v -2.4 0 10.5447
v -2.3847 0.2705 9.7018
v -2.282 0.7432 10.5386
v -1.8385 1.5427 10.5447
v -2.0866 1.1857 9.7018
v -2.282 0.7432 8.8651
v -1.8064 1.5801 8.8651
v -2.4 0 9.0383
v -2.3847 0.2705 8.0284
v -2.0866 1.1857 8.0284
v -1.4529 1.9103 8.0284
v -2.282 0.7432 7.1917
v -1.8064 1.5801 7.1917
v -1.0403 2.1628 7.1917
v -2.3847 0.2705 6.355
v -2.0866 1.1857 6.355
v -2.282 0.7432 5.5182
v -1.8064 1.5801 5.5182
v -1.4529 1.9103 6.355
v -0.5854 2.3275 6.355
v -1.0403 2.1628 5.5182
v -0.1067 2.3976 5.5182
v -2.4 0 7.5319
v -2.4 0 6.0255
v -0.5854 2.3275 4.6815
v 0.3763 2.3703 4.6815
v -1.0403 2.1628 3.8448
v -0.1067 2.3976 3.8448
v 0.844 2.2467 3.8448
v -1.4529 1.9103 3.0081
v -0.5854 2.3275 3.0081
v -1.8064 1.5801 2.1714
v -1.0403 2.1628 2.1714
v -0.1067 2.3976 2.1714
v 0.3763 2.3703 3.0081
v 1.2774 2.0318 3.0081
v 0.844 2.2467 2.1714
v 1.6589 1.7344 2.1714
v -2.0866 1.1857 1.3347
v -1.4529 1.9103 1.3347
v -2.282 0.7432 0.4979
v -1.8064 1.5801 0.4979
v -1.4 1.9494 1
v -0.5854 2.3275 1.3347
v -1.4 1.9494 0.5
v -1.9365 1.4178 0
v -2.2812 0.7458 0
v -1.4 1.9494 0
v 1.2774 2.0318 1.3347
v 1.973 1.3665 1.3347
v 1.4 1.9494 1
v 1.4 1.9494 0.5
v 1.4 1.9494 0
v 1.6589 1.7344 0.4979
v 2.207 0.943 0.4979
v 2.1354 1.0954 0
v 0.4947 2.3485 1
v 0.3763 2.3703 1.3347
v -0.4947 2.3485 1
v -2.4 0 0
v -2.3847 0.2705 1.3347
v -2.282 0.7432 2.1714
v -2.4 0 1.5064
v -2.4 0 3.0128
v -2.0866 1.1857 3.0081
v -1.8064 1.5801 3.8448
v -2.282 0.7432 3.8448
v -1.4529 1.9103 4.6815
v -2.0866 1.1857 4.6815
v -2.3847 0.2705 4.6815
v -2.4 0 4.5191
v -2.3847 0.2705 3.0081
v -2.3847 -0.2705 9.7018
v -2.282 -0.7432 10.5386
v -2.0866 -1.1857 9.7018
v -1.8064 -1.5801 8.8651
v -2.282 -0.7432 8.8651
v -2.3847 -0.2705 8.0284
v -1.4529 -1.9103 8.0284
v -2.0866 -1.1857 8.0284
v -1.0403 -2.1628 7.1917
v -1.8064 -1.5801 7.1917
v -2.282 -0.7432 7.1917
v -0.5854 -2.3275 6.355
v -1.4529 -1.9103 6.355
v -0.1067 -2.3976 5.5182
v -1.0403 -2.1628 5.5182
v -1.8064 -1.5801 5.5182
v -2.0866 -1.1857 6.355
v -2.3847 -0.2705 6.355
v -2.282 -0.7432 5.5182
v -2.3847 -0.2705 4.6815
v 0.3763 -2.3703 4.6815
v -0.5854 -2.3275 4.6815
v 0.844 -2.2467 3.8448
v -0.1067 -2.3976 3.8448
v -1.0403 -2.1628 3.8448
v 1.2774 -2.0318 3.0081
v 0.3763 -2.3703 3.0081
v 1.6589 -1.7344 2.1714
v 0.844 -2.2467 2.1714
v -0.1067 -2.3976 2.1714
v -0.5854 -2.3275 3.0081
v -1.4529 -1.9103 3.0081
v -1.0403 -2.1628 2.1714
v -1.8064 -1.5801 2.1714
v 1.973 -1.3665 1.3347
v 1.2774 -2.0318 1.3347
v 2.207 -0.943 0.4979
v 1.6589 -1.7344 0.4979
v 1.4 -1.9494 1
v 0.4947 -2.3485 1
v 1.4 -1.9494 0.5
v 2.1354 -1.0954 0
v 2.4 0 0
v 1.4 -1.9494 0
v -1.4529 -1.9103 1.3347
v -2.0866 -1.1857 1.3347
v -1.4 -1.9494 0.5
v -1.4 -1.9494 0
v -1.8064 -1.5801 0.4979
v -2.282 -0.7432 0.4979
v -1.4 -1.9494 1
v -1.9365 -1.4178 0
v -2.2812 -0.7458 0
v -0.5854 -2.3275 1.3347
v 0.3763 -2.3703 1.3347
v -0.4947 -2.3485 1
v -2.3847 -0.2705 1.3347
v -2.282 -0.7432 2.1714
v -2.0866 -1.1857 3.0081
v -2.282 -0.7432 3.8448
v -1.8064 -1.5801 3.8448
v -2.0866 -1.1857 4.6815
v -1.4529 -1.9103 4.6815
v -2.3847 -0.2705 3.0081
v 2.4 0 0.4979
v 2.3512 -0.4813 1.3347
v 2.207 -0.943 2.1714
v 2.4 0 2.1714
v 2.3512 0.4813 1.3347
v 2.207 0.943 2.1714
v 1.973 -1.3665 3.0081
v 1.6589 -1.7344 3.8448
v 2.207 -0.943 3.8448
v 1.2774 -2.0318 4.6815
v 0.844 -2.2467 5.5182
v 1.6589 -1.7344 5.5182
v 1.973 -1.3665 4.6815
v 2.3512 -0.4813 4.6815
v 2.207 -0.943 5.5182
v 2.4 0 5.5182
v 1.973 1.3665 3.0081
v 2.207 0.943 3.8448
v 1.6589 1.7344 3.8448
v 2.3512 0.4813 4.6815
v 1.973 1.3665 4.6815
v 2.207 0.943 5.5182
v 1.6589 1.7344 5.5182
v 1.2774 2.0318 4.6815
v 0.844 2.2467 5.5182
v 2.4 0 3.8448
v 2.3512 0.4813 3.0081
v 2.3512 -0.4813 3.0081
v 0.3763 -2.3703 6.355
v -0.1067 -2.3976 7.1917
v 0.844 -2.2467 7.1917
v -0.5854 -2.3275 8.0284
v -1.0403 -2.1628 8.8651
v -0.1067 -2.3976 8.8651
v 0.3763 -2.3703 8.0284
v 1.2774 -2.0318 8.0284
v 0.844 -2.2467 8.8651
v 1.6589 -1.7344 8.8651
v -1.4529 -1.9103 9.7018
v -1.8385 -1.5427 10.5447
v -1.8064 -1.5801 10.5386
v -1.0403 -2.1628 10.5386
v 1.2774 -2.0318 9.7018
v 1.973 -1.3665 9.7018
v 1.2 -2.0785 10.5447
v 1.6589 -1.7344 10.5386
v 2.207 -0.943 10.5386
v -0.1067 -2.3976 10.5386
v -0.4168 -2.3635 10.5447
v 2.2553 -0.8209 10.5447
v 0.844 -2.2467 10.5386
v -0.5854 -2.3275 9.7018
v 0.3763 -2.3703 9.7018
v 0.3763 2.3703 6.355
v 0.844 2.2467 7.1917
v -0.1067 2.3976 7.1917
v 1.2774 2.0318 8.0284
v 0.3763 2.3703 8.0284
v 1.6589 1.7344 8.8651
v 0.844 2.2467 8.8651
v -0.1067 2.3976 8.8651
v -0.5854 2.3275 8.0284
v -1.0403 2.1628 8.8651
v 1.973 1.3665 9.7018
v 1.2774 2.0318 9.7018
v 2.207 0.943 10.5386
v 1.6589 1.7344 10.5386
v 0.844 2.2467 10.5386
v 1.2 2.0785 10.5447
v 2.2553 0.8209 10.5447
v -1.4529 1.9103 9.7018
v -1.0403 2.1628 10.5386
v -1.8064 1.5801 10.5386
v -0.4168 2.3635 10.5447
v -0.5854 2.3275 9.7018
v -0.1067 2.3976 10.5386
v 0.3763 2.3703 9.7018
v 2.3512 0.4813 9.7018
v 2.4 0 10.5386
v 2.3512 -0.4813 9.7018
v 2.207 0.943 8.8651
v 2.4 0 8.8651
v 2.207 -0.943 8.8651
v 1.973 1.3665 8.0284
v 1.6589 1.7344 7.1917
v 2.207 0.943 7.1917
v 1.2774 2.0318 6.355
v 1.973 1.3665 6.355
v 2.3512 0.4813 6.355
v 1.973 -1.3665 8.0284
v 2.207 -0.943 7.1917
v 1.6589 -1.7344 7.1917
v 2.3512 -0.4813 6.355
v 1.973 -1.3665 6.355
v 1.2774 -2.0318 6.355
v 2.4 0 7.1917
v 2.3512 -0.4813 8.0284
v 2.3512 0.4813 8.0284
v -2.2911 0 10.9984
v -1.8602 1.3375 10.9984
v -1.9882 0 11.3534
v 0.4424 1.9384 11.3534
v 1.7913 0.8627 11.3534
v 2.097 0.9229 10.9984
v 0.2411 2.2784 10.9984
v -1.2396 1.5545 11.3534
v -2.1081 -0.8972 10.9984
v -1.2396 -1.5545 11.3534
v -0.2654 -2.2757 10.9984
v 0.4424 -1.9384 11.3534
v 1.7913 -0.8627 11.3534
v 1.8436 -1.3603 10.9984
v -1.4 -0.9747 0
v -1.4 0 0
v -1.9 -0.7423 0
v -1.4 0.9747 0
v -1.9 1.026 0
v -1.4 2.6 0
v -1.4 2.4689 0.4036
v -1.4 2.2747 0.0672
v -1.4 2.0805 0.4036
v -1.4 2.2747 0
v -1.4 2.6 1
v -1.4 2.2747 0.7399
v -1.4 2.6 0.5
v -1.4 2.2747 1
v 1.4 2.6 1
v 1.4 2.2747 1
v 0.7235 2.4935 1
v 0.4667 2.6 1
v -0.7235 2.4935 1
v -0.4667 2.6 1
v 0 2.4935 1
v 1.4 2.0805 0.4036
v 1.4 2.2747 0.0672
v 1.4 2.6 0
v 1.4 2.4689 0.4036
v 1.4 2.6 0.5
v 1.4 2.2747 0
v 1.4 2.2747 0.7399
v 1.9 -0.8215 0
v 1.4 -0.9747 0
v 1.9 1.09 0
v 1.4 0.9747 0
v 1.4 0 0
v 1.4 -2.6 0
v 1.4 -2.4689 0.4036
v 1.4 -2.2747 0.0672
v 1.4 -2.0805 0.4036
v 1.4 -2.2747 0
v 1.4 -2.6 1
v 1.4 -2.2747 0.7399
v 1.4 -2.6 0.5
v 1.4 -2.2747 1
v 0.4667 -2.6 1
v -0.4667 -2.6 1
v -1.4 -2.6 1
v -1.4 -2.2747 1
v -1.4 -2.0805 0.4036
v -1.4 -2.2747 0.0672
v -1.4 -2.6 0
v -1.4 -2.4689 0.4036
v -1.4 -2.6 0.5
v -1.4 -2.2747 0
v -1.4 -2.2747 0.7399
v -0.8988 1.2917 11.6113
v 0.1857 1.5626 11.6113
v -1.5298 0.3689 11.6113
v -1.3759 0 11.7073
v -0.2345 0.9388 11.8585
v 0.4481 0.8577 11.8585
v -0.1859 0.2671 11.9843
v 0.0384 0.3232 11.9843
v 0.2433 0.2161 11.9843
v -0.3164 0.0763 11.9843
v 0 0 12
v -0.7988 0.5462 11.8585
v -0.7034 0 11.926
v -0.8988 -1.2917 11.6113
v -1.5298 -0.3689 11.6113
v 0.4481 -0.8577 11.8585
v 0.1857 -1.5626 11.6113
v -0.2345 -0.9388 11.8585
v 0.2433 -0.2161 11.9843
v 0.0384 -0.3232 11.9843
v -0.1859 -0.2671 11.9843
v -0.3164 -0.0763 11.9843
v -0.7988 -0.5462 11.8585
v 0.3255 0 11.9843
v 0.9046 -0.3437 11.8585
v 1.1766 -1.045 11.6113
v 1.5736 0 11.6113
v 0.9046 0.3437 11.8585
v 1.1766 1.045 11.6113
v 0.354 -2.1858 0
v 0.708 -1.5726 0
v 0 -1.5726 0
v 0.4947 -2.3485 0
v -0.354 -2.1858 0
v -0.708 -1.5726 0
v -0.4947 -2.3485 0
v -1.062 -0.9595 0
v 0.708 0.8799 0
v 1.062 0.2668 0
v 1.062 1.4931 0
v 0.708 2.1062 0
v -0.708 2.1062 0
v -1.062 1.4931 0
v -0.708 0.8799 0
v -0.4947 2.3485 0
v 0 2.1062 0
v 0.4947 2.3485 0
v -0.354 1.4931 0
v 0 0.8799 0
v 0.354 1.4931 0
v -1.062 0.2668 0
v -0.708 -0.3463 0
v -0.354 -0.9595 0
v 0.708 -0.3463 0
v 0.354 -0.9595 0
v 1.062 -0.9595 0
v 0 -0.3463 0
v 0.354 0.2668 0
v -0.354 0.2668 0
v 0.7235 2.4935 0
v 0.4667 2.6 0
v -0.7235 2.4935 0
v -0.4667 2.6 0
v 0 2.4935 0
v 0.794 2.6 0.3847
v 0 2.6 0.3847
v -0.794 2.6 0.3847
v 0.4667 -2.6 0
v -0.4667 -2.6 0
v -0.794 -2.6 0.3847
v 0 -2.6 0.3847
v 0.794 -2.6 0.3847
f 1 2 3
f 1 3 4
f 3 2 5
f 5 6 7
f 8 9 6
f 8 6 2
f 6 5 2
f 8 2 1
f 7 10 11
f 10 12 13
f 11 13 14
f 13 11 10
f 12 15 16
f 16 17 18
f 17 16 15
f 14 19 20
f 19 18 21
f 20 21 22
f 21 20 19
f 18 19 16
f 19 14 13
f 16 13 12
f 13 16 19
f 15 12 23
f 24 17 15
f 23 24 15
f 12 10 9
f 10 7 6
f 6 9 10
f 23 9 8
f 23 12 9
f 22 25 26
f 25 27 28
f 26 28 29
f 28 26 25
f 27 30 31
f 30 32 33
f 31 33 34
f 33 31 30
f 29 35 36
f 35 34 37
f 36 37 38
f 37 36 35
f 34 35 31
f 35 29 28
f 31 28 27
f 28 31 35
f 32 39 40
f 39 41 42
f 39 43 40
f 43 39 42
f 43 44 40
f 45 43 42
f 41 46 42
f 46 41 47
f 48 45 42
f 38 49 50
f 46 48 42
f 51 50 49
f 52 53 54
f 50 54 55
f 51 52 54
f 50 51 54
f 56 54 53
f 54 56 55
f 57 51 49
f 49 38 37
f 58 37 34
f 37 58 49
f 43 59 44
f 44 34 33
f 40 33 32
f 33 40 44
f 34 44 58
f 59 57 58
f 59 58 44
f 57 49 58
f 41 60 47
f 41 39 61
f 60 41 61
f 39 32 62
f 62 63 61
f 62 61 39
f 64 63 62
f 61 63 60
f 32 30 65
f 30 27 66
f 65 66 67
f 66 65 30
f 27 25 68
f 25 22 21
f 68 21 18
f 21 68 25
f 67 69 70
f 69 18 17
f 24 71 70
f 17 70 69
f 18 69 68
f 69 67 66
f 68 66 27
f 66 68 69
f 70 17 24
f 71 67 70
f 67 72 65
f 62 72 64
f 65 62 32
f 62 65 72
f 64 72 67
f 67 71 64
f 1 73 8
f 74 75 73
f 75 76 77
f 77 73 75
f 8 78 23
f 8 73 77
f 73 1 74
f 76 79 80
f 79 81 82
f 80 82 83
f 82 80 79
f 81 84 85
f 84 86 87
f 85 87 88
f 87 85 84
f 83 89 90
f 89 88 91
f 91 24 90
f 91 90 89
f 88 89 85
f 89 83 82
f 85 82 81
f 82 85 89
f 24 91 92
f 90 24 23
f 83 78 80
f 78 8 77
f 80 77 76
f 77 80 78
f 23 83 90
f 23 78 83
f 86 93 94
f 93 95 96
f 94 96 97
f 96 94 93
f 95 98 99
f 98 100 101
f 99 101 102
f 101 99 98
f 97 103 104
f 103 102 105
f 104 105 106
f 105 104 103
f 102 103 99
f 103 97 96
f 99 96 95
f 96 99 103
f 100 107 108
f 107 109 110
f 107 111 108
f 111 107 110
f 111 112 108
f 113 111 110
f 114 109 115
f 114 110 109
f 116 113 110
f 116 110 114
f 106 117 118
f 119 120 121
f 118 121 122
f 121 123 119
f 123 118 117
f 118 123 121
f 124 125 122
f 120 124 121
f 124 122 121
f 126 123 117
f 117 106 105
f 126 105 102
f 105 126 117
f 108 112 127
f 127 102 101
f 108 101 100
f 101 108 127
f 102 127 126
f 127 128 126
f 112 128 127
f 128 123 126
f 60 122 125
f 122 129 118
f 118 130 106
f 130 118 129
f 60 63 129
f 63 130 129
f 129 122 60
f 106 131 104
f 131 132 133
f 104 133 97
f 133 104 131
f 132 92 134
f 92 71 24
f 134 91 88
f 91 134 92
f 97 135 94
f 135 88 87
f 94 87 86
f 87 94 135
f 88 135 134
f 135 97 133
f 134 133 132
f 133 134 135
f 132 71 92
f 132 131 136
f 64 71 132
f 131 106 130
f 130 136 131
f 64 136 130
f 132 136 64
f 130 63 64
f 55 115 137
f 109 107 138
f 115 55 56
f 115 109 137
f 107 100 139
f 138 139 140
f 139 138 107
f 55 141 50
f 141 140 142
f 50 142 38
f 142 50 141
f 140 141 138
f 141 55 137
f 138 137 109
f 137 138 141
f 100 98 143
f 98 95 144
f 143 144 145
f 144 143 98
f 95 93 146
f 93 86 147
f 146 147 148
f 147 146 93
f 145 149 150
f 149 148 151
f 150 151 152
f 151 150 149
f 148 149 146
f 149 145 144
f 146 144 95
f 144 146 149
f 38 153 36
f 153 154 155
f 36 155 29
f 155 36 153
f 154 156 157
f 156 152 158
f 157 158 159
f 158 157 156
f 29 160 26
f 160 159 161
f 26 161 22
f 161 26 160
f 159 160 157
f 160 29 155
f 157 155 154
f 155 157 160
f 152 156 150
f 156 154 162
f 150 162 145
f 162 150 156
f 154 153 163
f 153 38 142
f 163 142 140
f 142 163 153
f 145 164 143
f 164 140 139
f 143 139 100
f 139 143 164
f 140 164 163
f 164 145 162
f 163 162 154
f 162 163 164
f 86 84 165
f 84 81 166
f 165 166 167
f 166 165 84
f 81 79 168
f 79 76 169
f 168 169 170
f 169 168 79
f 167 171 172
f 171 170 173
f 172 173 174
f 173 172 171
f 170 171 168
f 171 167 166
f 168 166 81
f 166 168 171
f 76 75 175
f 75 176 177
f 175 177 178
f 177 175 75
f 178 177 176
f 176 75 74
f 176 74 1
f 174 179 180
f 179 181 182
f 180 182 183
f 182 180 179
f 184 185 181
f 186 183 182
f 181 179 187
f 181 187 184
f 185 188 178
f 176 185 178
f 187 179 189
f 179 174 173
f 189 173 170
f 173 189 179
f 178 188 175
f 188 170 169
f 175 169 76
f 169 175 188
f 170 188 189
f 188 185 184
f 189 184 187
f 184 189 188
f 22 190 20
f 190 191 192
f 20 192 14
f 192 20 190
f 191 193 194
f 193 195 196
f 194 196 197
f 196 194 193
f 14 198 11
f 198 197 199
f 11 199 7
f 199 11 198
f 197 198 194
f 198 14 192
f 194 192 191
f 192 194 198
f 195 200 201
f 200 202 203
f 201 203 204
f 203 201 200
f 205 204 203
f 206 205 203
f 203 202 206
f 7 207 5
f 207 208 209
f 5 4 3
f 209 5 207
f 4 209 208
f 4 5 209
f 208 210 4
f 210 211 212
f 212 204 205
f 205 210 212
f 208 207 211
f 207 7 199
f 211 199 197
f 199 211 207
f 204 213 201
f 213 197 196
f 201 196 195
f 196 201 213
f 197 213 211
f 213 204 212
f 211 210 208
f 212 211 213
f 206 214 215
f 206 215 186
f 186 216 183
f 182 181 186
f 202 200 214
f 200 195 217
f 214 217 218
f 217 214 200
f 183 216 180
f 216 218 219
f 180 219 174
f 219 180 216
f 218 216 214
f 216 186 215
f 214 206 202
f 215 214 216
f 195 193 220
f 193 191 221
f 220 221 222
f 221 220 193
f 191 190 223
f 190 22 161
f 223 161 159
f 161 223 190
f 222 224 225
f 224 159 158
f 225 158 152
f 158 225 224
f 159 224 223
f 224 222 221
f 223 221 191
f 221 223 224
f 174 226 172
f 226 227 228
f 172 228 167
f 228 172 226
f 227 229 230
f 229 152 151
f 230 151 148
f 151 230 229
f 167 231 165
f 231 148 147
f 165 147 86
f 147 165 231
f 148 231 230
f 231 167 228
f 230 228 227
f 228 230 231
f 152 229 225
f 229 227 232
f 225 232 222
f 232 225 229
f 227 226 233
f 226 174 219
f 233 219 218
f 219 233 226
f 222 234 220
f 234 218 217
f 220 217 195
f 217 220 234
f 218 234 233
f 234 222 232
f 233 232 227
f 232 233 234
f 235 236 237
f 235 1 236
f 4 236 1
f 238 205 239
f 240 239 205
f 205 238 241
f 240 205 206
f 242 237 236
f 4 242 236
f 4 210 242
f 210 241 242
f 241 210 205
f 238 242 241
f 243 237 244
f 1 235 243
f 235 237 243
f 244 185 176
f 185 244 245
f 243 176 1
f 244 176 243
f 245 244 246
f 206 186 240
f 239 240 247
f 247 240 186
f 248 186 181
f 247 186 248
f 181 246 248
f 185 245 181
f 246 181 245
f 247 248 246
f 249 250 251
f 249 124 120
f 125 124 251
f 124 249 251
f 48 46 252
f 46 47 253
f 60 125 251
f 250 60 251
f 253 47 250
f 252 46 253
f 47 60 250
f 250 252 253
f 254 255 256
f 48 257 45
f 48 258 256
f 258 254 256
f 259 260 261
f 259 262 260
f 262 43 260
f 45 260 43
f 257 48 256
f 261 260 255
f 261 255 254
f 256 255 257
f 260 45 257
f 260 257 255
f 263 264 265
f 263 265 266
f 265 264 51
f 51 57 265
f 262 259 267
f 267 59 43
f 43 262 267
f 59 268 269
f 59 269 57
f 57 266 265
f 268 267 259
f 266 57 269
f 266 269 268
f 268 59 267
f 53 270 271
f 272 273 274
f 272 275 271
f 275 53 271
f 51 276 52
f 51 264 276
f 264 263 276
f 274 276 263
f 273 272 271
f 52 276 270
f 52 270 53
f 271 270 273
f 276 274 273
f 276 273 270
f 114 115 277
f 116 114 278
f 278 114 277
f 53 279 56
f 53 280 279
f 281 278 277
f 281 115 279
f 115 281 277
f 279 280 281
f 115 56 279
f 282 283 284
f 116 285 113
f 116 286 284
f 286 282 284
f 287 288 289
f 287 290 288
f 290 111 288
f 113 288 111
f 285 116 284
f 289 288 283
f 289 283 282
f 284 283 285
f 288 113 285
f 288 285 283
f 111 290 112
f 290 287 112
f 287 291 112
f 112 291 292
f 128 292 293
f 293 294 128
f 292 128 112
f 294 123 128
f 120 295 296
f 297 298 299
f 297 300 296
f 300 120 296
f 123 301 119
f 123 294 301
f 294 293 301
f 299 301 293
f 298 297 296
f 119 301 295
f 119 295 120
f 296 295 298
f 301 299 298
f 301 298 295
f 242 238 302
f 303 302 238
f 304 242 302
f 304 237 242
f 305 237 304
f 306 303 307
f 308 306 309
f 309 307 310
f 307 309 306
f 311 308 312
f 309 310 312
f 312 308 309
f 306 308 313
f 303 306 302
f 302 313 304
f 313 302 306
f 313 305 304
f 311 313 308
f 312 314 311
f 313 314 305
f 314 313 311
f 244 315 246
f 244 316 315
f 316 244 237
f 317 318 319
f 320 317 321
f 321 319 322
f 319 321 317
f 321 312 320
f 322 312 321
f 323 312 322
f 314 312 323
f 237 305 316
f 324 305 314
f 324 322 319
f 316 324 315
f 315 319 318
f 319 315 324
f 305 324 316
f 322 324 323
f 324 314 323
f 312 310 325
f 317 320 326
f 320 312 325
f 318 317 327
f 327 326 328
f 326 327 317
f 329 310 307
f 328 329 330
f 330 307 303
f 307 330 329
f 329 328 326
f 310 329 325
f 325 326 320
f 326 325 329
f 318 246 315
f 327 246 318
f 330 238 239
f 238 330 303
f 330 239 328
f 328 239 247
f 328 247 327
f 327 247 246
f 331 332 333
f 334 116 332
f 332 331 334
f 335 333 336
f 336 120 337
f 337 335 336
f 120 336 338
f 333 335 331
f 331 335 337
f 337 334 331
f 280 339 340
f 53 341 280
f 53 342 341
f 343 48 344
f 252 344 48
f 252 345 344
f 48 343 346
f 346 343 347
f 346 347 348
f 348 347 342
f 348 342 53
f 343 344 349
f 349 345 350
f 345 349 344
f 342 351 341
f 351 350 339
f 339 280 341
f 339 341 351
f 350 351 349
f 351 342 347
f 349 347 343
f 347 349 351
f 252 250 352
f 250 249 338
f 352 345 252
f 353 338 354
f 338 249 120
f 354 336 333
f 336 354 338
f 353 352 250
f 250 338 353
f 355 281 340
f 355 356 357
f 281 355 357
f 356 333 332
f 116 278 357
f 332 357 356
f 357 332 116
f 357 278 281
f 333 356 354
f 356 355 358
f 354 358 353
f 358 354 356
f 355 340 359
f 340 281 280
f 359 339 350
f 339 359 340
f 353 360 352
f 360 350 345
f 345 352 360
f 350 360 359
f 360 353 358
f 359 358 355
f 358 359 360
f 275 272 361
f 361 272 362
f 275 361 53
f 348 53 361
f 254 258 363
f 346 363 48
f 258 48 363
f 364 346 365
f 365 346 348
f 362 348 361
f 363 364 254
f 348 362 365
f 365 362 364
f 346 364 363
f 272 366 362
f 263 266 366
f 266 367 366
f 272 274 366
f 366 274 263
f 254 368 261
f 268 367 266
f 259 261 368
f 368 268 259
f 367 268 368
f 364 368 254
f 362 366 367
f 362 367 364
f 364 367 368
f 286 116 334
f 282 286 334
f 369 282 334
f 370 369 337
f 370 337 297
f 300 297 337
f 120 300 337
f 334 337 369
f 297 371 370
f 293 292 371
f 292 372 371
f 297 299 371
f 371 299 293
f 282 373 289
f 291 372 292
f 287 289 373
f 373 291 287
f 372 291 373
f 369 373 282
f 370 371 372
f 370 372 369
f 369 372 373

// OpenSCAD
// CSG file generated from FreeCAD 0.21.2
group() {
 group(){
polyhedron ( points = [[-2.400000,0.000000,10.544682],[-2.400000,0.000000,0.000000],[-1.400000,1.949359,-0.000000],[-1.400000,1.949359,1.000000],[1.400000,1.949359,1.000000],[1.400000,1.949359,-0.000000],[1.400000,-1.949359,0.000000],[1.400000,-1.949359,1.000000],[-1.400000,-1.949359,1.000000],[-1.400000,-1.949359,0.000000],[-1.988235,0.000000,11.353372],[-1.400000,2.600000,-0.000000],[-1.400000,2.600000,1.000000],[1.400000,2.600000,1.000000],[1.400000,2.600000,-0.000000],[1.400000,-2.600000,0.000000],[1.400000,-2.600000,1.000000],[-1.400000,-2.600000,1.000000],[-1.400000,-2.600000,0.000000],[0.000000,0.000000,12.000000],[-1.838511,-1.542697,10.544682],[-0.416754,-2.363537,10.544682],[1.200003,-2.078461,10.544682],[2.255261,-0.820850,10.544682],[2.255261,0.820850,10.544682],[1.200003,2.078461,10.544682],[-0.416754,2.363537,10.544682],[-1.838511,1.542697,10.544682],[-2.400000,0.000000,1.506383],[-2.400000,0.000000,3.012766],[-2.400000,0.000000,4.519149],[-2.400000,0.000000,6.025532],[-2.400000,0.000000,7.531916],[-2.400000,0.000000,9.038299],[-1.936463,1.417784,-0.000000],[-2.281174,0.745818,-0.000000],[-1.400000,1.949359,0.500000],[0.494690,2.348464,1.000000],[-0.494690,2.348464,1.000000],[1.400000,1.949359,0.500000],[2.135416,-1.095445,0.000000],[2.400000,-0.000000,0.000000],[2.135416,1.095445,-0.000000],[1.400000,-1.949359,0.500000],[-0.494690,-2.348464,1.000000],[0.494690,-2.348464,1.000000],[-1.400000,-1.949359,0.500000],[-2.281174,-0.745818,0.000000],[-1.936463,-1.417784,0.000000],[-2.291133,0.000000,10.998425],[-1.239645,-1.554466,11.353372],[0.442425,-1.938383,11.353372],[1.791340,-0.862666,11.353372],[1.791340,0.862666,11.353372],[0.442425,1.938383,11.353372],[-1.239645,1.554466,11.353372],[-1.400000,-0.974679,0.000000],[-1.400000,0.000000,-0.000000],[-1.400000,0.974679,-0.000000],[-1.400000,2.274679,-0.000000],[-1.400000,2.600000,0.500000],[-1.400000,2.274679,1.000000],[-0.466667,2.600000,1.000000],[0.466667,2.600000,1.000000],[1.400000,2.274679,1.000000],[1.400000,2.274679,-0.000000],[1.400000,2.600000,0.500000],[1.400000,0.974679,-0.000000],[1.400000,0.000000,0.000000],[1.400000,-0.974679,0.000000],[1.400000,-2.274679,0.000000],[1.400000,-2.600000,0.500000],[1.400000,-2.274679,1.000000],[0.466667,-2.600000,1.000000],[-0.466667,-2.600000,1.000000],[-1.400000,-2.274679,1.000000],[-1.400000,-2.274679,0.000000],[-1.400000,-2.600000,0.500000],[-0.703355,0.000000,11.926008],[-1.375915,0.000000,11.707273],[0.000000,0.000000,12.000000],[0.000000,0.000000,12.000000],[0.000000,0.000000,12.000000],[-0.494690,-2.348464,0.000000],[0.494690,-2.348464,0.000000],[0.494690,2.348464,-0.000000],[-0.494690,2.348464,-0.000000],[-0.466667,2.600000,-0.000000],[0.466667,2.600000,-0.000000],[0.466667,-2.600000,0.000000],[-0.466667,-2.600000,0.000000],[-0.106736,-2.397625,5.518247],[1.658890,-1.734383,2.171372],[-1.806442,-1.580116,2.171372],[-2.282026,-0.743207,0.497934],[-0.106736,2.397625,5.518247],[-1.806442,1.580116,2.171372],[1.658890,1.734383,2.171372],[-2.282026,0.743207,0.497934],[-1.806442,1.580116,8.865123],[-1.806442,-1.580116,8.865123],[2.400000,0.000000,5.518247],[1.658890,-1.734383,8.865123],[1.658890,1.734383,8.865123],[-2.282026,0.743207,10.538560],[-2.282026,0.743207,7.191685],[-1.040261,2.162835,7.191685],[-1.806442,1.580116,5.518247],[-1.040261,2.162835,3.844810],[0.843960,2.246716,3.844810],[-0.106736,2.397625,2.171372],[2.206959,0.943044,0.497934],[-2.282026,0.743207,3.844810],[-2.282026,-0.743207,10.538560],[-1.040261,-2.162835,7.191685],[-2.282026,-0.743207,7.191685],[-1.806442,-1.580116,5.518247],[0.843960,-2.246716,3.844810],[-1.040261,-2.162835,3.844810],[-0.106736,-2.397625,2.171372],[2.206959,-0.943044,0.497934],[-2.282026,-0.743207,3.844810],[2.400000,0.000000,2.171372],[2.206959,-0.943044,3.844810],[1.658890,-1.734383,5.518247],[2.206959,0.943044,3.844810],[1.658890,1.734383,5.518247],[0.843960,-2.246716,7.191685],[-0.106736,-2.397625,8.865123],[-1.040261,-2.162835,10.538560],[0.843960,-2.246716,10.538560],[2.206959,-0.943044,10.538560],[0.843960,2.246716,7.191685],[-0.106736,2.397625,8.865123],[2.206959,0.943044,10.538560],[0.843960,2.246716,10.538560],[-1.040261,2.162835,10.538560],[2.400000,0.000000,8.865123],[2.206959,0.943044,7.191685],[2.206959,-0.943044,7.191685],[-2.384711,0.270468,9.701841],[-2.086624,1.185749,9.701841],[-2.282026,0.743207,8.865123],[-2.086624,1.185749,8.028403],[-1.452866,1.910282,8.028403],[-1.806442,1.580116,7.191685],[-2.384711,0.270468,6.354966],[-2.086624,1.185749,6.354966],[-2.282026,0.743207,5.518247],[-1.452866,1.910282,6.354966],[-0.585390,2.327513,6.354966],[-1.040261,2.162835,5.518247],[-2.384711,0.270468,8.028403],[-0.585390,2.327513,4.681529],[0.376256,2.370323,4.681529],[-0.106736,2.397625,3.844810],[-1.452866,1.910282,3.008091],[-0.585390,2.327513,3.008091],[-1.040261,2.162835,2.171372],[0.376256,2.370323,3.008091],[1.277375,2.031825,3.008091],[0.843960,2.246716,2.171372],[-2.086624,1.185749,1.334653],[-1.452866,1.910282,1.334653],[-1.806442,1.580116,0.497934],[1.277375,2.031825,1.334653],[1.973006,1.366473,1.334653],[1.658890,1.734383,0.497934],[0.376256,2.370323,1.334653],[-0.585390,2.327513,1.334653],[-2.384711,0.270468,1.334653],[-2.282026,0.743207,2.171372],[-2.086624,1.185749,3.008091],[-1.806442,1.580116,3.844810],[-1.452866,1.910282,4.681529],[-2.086624,1.185749,4.681529],[-2.384711,0.270468,4.681529],[-2.384711,0.270468,3.008091],[-2.086624,-1.185749,9.701841],[-2.384711,-0.270468,9.701841],[-2.282026,-0.743207,8.865123],[-1.452866,-1.910282,8.028403],[-2.086624,-1.185749,8.028403],[-1.806442,-1.580116,7.191685],[-0.585390,-2.327513,6.354966],[-1.452866,-1.910282,6.354966],[-1.040261,-2.162835,5.518247],[-2.086624,-1.185749,6.354966],[-2.384711,-0.270468,6.354966],[-2.282026,-0.743207,5.518247],[-2.384711,-0.270468,8.028403],[0.376256,-2.370323,4.681529],[-0.585390,-2.327513,4.681529],[-0.106736,-2.397625,3.844810],[1.277375,-2.031825,3.008091],[0.376256,-2.370323,3.008091],[0.843960,-2.246716,2.171372],[-0.585390,-2.327513,3.008091],[-1.452866,-1.910282,3.008091],[-1.040261,-2.162835,2.171372],[1.973006,-1.366473,1.334653],[1.277375,-2.031825,1.334653],[1.658890,-1.734383,0.497934],[-1.452866,-1.910282,1.334653],[-2.086624,-1.185749,1.334653],[-1.806442,-1.580116,0.497934],[-0.585390,-2.327513,1.334653],[0.376256,-2.370323,1.334653],[-2.384711,-0.270468,1.334653],[-2.282026,-0.743207,2.171372],[-2.086624,-1.185749,3.008091],[-1.806442,-1.580116,3.844810],[-2.384711,-0.270468,4.681529],[-2.086624,-1.185749,4.681529],[-1.452866,-1.910282,4.681529],[-2.384711,-0.270468,3.008091],[2.400000,0.000000,0.497934],[2.351244,-0.481299,1.334653],[2.206959,-0.943044,2.171372],[2.351244,0.481299,1.334653],[2.206959,0.943044,2.171372],[1.973006,-1.366473,3.008091],[1.658890,-1.734383,3.844810],[1.277375,-2.031825,4.681529],[0.843960,-2.246716,5.518247],[1.973006,-1.366473,4.681529],[2.351244,-0.481299,4.681529],[2.206959,-0.943044,5.518247],[1.973006,1.366473,3.008091],[1.658890,1.734383,3.844810],[2.351244,0.481299,4.681529],[1.973006,1.366473,4.681529],[2.206959,0.943044,5.518247],[1.277375,2.031825,4.681529],[0.843960,2.246716,5.518247],[2.400000,0.000000,3.844810],[2.351244,0.481299,3.008091],[2.351244,-0.481299,3.008091],[0.376256,-2.370323,6.354966],[-0.106736,-2.397625,7.191685],[-0.585390,-2.327513,8.028403],[-1.040261,-2.162835,8.865123],[0.376256,-2.370323,8.028403],[1.277375,-2.031825,8.028403],[0.843960,-2.246716,8.865123],[-1.452866,-1.910282,9.701841],[-1.806442,-1.580116,10.538560],[1.277375,-2.031825,9.701841],[1.973006,-1.366473,9.701841],[1.658890,-1.734383,10.538560],[-0.106736,-2.397625,10.538560],[0.376256,-2.370323,9.701841],[-0.585390,-2.327513,9.701841],[0.376256,2.370323,6.354966],[-0.106736,2.397625,7.191685],[1.277375,2.031825,8.028403],[0.376256,2.370323,8.028403],[0.843960,2.246716,8.865123],[-0.585390,2.327513,8.028403],[-1.040261,2.162835,8.865123],[1.973006,1.366473,9.701841],[1.277375,2.031825,9.701841],[1.658890,1.734383,10.538560],[-1.452866,1.910282,9.701841],[-1.806442,1.580116,10.538560],[-0.106736,2.397625,10.538560],[-0.585390,2.327513,9.701841],[0.376256,2.370323,9.701841],[2.400000,0.000000,10.538560],[2.351244,0.481299,9.701841],[2.206959,0.943044,8.865123],[2.351244,-0.481299,9.701841],[2.206959,-0.943044,8.865123],[1.973006,1.366473,8.028403],[1.658890,1.734383,7.191685],[1.277375,2.031825,6.354966],[1.973006,1.366473,6.354966],[2.351244,0.481299,6.354966],[1.973006,-1.366473,8.028403],[1.658890,-1.734383,7.191685],[2.351244,-0.481299,6.354966],[1.973006,-1.366473,6.354966],[1.277375,-2.031825,6.354966],[2.400000,0.000000,7.191685],[2.351244,-0.481299,8.028403],[2.351244,0.481299,8.028403],[2.097039,0.922890,10.998425],[-0.265358,-2.275712,10.998425],[-1.860187,1.337547,10.998425],[0.241087,2.278410,10.998425],[-2.108138,-0.897234,10.998425],[1.843614,-1.360298,10.998425],[-1.900000,-0.742267,0.000000],[-1.900000,1.025995,-0.000000],[-1.400000,2.274679,0.067220],[-1.400000,2.274679,0.739940],[-1.400000,2.080482,0.403580],[-1.400000,2.468877,0.403580],[-0.723531,2.493466,1.000000],[0.723531,2.493466,1.000000],[0.000000,2.493466,1.000000],[1.400000,2.274679,0.067220],[1.400000,2.274679,0.739940],[1.400000,2.468877,0.403580],[1.400000,2.080482,0.403580],[1.900000,-0.821529,0.000000],[1.900000,1.090026,-0.000000],[1.400000,-2.274679,0.067220],[1.400000,-2.274679,0.739940],[1.400000,-2.080482,0.403580],[1.400000,-2.468877,0.403580],[-1.400000,-2.274679,0.067220],[-1.400000,-2.274679,0.739940],[-1.400000,-2.468877,0.403580],[-1.400000,-2.080482,0.403580],[0.185749,-1.562642,11.611329],[0.185749,1.562642,11.611329],[-1.529792,0.368901,11.611329],[-0.185892,0.267148,11.984294],[0.243338,0.216126,11.984294],[-1.529792,-0.368901,11.611329],[0.243338,-0.216126,11.984294],[-0.185892,-0.267148,11.984294],[1.573643,0.000000,11.611329],[-0.898814,1.291698,11.611329],[-0.234538,0.938837,11.858515],[0.448089,0.857694,11.858515],[0.038416,0.323184,11.984294],[-0.316390,0.076296,11.984294],[-0.798806,0.546197,11.858515],[-0.898814,-1.291698,11.611329],[0.448089,-0.857694,11.858515],[-0.234538,-0.938837,11.858515],[0.038416,-0.323184,11.984294],[-0.316390,-0.076296,11.984294],[-0.798806,-0.546197,11.858515],[0.325459,0.000000,11.984294],[0.904589,-0.343717,11.858515],[1.176574,-1.045000,11.611329],[0.904589,0.343717,11.858515],[1.176574,1.045000,11.611329],[0.000000,-1.572620,0.000000],[0.707994,2.106224,-0.000000],[-0.707994,2.106224,-0.000000],[0.000000,0.879942,-0.000000],[-0.707994,-0.346339,0.000000],[0.707994,-0.346339,0.000000],[0.353997,-2.185760,0.000000],[0.707994,-1.572620,0.000000],[-0.353997,-2.185760,0.000000],[-0.707994,-1.572620,0.000000],[1.061990,1.493083,-0.000000],[-1.061990,1.493083,-0.000000],[0.000000,2.106224,-0.000000],[-0.353997,1.493083,-0.000000],[-0.707994,0.879942,-0.000000],[0.353997,1.493083,-0.000000],[0.707994,0.879942,-0.000000],[-1.061990,0.266802,-0.000000],[-1.061990,-0.959479,0.000000],[-0.353997,-0.959479,0.000000],[1.061990,0.266802,-0.000000],[0.353997,-0.959479,0.000000],[1.061990,-0.959479,0.000000],[0.000000,-0.346339,0.000000],[0.353997,0.266802,-0.000000],[-0.353997,0.266802,-0.000000],[-0.723531,2.493466,-0.000000],[0.723531,2.493466,-0.000000],[-0.000000,2.493466,-0.000000],[-0.794034,2.600000,0.384693],[0.794034,2.600000,0.384693],[0.000000,2.600000,0.384693],[0.794034,-2.600000,0.384693],[-0.794034,-2.600000,0.384693],[-0.000000,-2.600000,0.384693]], faces = [[104,140,0],[27,104,0],[141,140,104],[99,142,141],[142,152,33],[140,142,33],[140,141,142],[0,140,33],[144,143,99],[145,105,143],[106,145,144],[143,144,145],[147,146,105],[107,148,147],[146,147,148],[150,149,106],[151,107,149],[95,151,150],[149,150,151],[147,149,107],[145,106,149],[105,145,147],[149,147,145],[32,105,146],[146,148,31],[146,31,32],[152,143,105],[142,99,143],[143,152,142],[33,152,32],[152,105,32],[154,153,95],[155,108,153],[109,155,154],[153,154,155],[157,156,108],[158,96,156],[110,158,157],[156,157,158],[160,159,109],[161,110,159],[97,161,160],[159,160,161],[157,159,110],[155,109,159],[108,155,157],[159,157,155],[163,162,96],[164,98,162],[163,3,162],[164,162,3],[163,169,3],[164,3,36],[164,34,98],[35,98,34],[164,36,2],[166,165,97],[164,2,34],[165,166,4],[167,5,39],[111,167,166],[167,39,4],[167,4,166],[5,167,42],[111,42,167],[165,4,37],[161,97,165],[110,161,168],[165,168,161],[169,38,3],[158,110,169],[96,158,163],[169,163,158],[168,169,110],[168,37,38],[169,168,38],[168,165,37],[35,1,98],[170,162,98],[170,98,1],[171,96,162],[170,28,171],[162,170,171],[171,28,29],[1,28,170],[172,156,96],[173,108,156],[112,173,172],[156,172,173],[174,153,108],[151,95,153],[107,151,174],[153,174,151],[176,175,112],[148,107,175],[176,30,31],[175,176,148],[174,175,107],[173,112,175],[108,173,174],[175,174,173],[31,148,176],[176,112,30],[172,177,112],[29,177,171],[96,171,172],[177,172,171],[112,177,29],[29,30,112],[33,179,0],[179,178,113],[180,100,178],[178,179,180],[32,190,33],[180,179,33],[113,0,179],[182,181,100],[183,114,181],[115,183,182],[181,182,183],[185,184,114],[186,91,184],[116,186,185],[184,185,186],[188,187,115],[189,116,187],[188,31,189],[187,188,189],[185,187,116],[183,115,187],[114,183,185],[187,185,183],[212,189,31],[32,31,188],[182,190,115],[180,33,190],[100,180,182],[190,182,180],[188,115,32],[115,190,32],[192,191,91],[193,117,191],[118,193,192],[191,192,193],[195,194,117],[196,92,194],[119,196,195],[194,195,196],[198,197,118],[199,119,197],[93,199,198],[197,198,199],[195,197,119],[193,118,197],[117,193,195],[197,195,193],[201,200,92],[202,120,200],[201,7,200],[202,200,7],[201,45,7],[202,7,43],[41,120,40],[120,202,40],[202,43,6],[40,202,6],[204,203,93],[205,9,46],[94,205,204],[46,8,205],[203,204,8],[205,8,204],[94,47,48],[205,48,9],[205,94,48],[203,8,206],[199,93,203],[119,199,206],[203,206,199],[207,45,201],[196,119,207],[92,196,201],[207,201,196],[206,207,119],[206,44,207],[207,44,45],[206,8,44],[47,94,1],[204,208,94],[93,209,204],[208,204,209],[208,28,1],[208,209,28],[1,94,208],[198,210,93],[211,121,210],[118,211,198],[210,198,211],[213,212,121],[31,30,212],[116,189,213],[212,213,189],[192,214,118],[186,116,214],[91,186,192],[214,192,186],[213,214,116],[211,118,214],[121,211,213],[214,213,211],[212,30,121],[215,210,121],[121,30,29],[209,93,210],[210,215,209],[209,215,29],[29,215,121],[29,28,209],[216,41,111],[217,200,120],[42,111,41],[216,120,41],[218,92,200],[122,218,217],[200,217,218],[166,219,111],[220,122,219],[97,220,166],[219,166,220],[217,219,122],[216,111,219],[120,216,217],[219,217,216],[221,194,92],[222,117,194],[123,222,221],[194,221,222],[223,191,117],[224,91,191],[124,224,223],[191,223,224],[226,225,123],[227,124,225],[101,227,226],[225,226,227],[223,225,124],[222,123,225],[117,222,223],[225,223,222],[160,228,97],[229,125,228],[109,229,160],[228,160,229],[231,230,125],[232,101,230],[126,232,231],[230,231,232],[154,233,109],[234,126,233],[95,234,154],[233,154,234],[231,233,126],[229,109,233],[125,229,231],[233,231,229],[226,230,101],[235,125,230],[123,235,226],[230,226,235],[236,228,125],[220,97,228],[122,220,236],[228,236,220],[221,237,123],[218,122,237],[92,218,221],[237,221,218],[236,237,122],[235,123,237],[125,235,236],[237,236,235],[238,184,91],[239,114,184],[127,239,238],[184,238,239],[240,181,114],[241,100,181],[128,241,240],[181,240,241],[243,242,127],[244,128,242],[102,244,243],[242,243,244],[240,242,128],[239,127,242],[114,239,240],[242,240,239],[245,178,100],[246,20,178],[129,246,245],[178,245,246],[20,246,129],[113,178,20],[0,113,20],[248,247,102],[249,22,247],[131,249,248],[247,248,249],[22,21,250],[249,131,23],[130,247,22],[250,130,22],[129,252,21],[129,21,20],[251,247,130],[244,102,247],[128,244,251],[247,251,244],[245,252,129],[241,128,252],[100,241,245],[252,245,241],[251,252,128],[250,21,252],[130,250,251],[252,251,250],[150,253,95],[254,132,253],[106,254,150],[253,150,254],[256,255,132],[257,103,255],[133,257,256],[255,256,257],[144,258,106],[259,133,258],[99,259,144],[258,144,259],[256,258,133],[254,106,258],[132,254,256],[258,256,254],[261,260,103],[262,134,260],[135,262,261],[260,261,262],[262,135,25],[262,25,24],[24,134,262],[141,263,99],[264,136,263],[104,27,141],[263,141,264],[136,264,27],[264,141,27],[27,26,136],[265,266,26],[25,135,265],[265,26,25],[266,263,136],[259,99,263],[133,259,266],[263,266,259],[261,267,135],[257,133,267],[103,257,261],[267,261,257],[266,267,133],[265,135,267],[136,26,266],[267,266,265],[268,269,24],[23,268,24],[131,271,23],[23,22,249],[269,260,134],[270,103,260],[137,270,269],[260,269,270],[248,271,131],[272,137,271],[102,272,248],[271,248,272],[269,271,137],[268,23,271],[134,24,269],[271,269,268],[273,255,103],[274,132,255],[138,274,273],[255,273,274],[275,253,132],[234,95,253],[126,234,275],[253,275,234],[277,276,138],[232,126,276],[101,232,277],[276,277,232],[275,276,126],[274,138,276],[132,274,275],[276,275,274],[243,278,102],[279,139,278],[127,279,243],[278,243,279],[281,280,139],[227,101,280],[124,227,281],[280,281,227],[238,282,127],[224,124,282],[91,224,238],[282,238,224],[281,282,124],[279,127,282],[139,279,281],[282,281,279],[277,280,101],[283,139,280],[138,283,277],[280,277,283],[284,278,139],[272,102,278],[137,272,284],[278,284,272],[273,285,138],[270,137,285],[103,270,273],[285,273,270],[284,285,137],[283,138,285],[139,283,284],[285,284,283],[10,288,49],[288,0,49],[0,288,27],[53,25,54],[25,53,286],[289,54,25],[24,25,286],[288,10,55],[288,55,27],[55,26,27],[55,289,26],[25,26,289],[289,55,54],[50,10,290],[290,49,0],[290,10,49],[20,21,50],[287,50,21],[0,20,290],[290,20,50],[51,50,287],[286,23,24],[52,286,53],[23,286,52],[22,23,291],[291,23,52],[291,51,22],[22,287,21],[287,22,51],[51,291,52],[292,57,56],[9,48,56],[292,48,47],[292,56,48],[58,34,2],[293,35,34],[292,47,1],[292,1,57],[57,35,293],[293,34,58],[57,1,35],[293,58,57],[294,297,11],[36,296,2],[294,59,2],[294,11,59],[60,295,12],[295,61,12],[295,3,61],[3,295,36],[294,2,296],[297,295,60],[11,297,60],[296,297,294],[296,36,295],[297,296,295],[299,64,13],[63,299,13],[4,64,299],[299,37,4],[298,12,61],[3,38,298],[298,61,3],[300,62,38],[37,300,38],[299,63,37],[12,298,62],[300,37,63],[62,300,63],[298,38,62],[301,304,5],[66,303,14],[301,65,14],[301,5,65],[39,302,4],[302,64,4],[302,13,64],[13,302,66],[301,14,303],[304,302,39],[5,304,39],[303,304,301],[303,66,302],[304,303,302],[305,41,40],[69,40,6],[305,40,69],[42,306,5],[306,67,5],[305,69,68],[306,41,68],[305,68,41],[68,67,306],[306,42,41],[307,310,15],[43,309,6],[307,70,6],[307,15,70],[71,308,16],[308,72,16],[308,7,72],[7,308,43],[307,6,309],[310,308,71],[15,310,71],[309,310,307],[309,43,308],[310,309,308],[45,72,7],[45,16,72],[45,73,16],[74,73,45],[17,74,44],[44,75,17],[45,44,74],[44,8,75],[311,314,9],[77,313,18],[311,76,18],[311,9,76],[46,312,8],[312,75,8],[312,17,75],[17,312,77],[311,18,313],[314,312,46],[9,314,46],[313,314,311],[313,77,312],[314,313,312],[324,54,55],[54,324,316],[324,55,317],[55,10,317],[317,10,79],[326,316,325],[327,325,318],[319,326,327],[325,327,326],[19,318,328],[19,319,327],[327,318,19],[329,318,325],[324,325,316],[317,329,324],[325,324,329],[317,79,329],[318,329,328],[328,78,19],[79,78,329],[328,329,78],[51,330,50],[330,320,50],[10,50,320],[332,315,331],[333,331,321],[322,332,333],[331,333,332],[321,19,333],[333,19,322],[322,19,334],[334,19,78],[320,79,10],[78,79,335],[332,322,335],[330,335,320],[315,332,330],[335,330,332],[320,335,79],[334,335,322],[334,78,335],[336,319,19],[337,321,331],[336,19,321],[338,331,315],[323,337,338],[331,338,337],[326,319,339],[340,339,323],[316,326,340],[339,340,326],[337,323,339],[336,339,319],[321,337,336],[339,336,337],[330,51,315],[315,51,338],[53,54,340],[316,340,54],[323,53,340],[52,53,323],[338,52,323],[51,52,338],[341,348,347],[348,6,84],[84,347,348],[350,341,349],[83,9,350],[350,349,83],[359,350,9],[347,349,341],[83,349,347],[347,84,83],[361,357,67],[67,351,5],[351,342,5],[352,2,343],[2,352,58],[352,355,58],[86,343,2],[353,343,86],[85,353,86],[342,353,85],[5,342,85],[354,352,343],[344,355,354],[352,354,355],[351,356,342],[357,344,356],[351,67,357],[356,351,357],[354,356,344],[353,342,356],[343,353,354],[356,354,353],[358,57,58],[359,56,57],[58,355,358],[360,359,345],[9,56,359],[341,350,360],[359,360,350],[57,358,345],[345,359,57],[361,68,346],[363,362,346],[363,346,68],[348,341,362],[363,69,6],[362,363,348],[6,348,363],[68,69,363],[360,362,341],[364,346,362],[345,364,360],[362,360,364],[365,361,346],[67,68,361],[344,357,365],[361,365,357],[358,366,345],[355,344,366],[366,358,355],[365,366,344],[364,345,366],[346,364,365],[366,365,364],[368,14,65],[88,14,368],[5,368,65],[368,5,85],[367,59,11],[2,367,86],[367,2,59],[369,86,87],[85,86,369],[368,85,88],[11,87,367],[369,88,85],[87,88,369],[367,87,86],[88,371,14],[371,63,13],[371,372,63],[371,66,14],[13,66,371],[60,370,11],[63,372,62],[370,60,12],[12,62,370],[370,62,372],[11,370,87],[372,371,88],[87,372,88],[370,372,87],[84,6,70],[84,70,15],[84,15,89],[83,89,90],[18,83,90],[83,18,76],[83,76,9],[89,83,84],[90,374,18],[374,74,17],[374,375,74],[374,77,18],[17,77,374],[71,373,15],[74,375,73],[373,71,16],[16,73,373],[373,73,375],[15,373,89],[375,374,90],[89,375,90],[373,375,89]]);
}
}
